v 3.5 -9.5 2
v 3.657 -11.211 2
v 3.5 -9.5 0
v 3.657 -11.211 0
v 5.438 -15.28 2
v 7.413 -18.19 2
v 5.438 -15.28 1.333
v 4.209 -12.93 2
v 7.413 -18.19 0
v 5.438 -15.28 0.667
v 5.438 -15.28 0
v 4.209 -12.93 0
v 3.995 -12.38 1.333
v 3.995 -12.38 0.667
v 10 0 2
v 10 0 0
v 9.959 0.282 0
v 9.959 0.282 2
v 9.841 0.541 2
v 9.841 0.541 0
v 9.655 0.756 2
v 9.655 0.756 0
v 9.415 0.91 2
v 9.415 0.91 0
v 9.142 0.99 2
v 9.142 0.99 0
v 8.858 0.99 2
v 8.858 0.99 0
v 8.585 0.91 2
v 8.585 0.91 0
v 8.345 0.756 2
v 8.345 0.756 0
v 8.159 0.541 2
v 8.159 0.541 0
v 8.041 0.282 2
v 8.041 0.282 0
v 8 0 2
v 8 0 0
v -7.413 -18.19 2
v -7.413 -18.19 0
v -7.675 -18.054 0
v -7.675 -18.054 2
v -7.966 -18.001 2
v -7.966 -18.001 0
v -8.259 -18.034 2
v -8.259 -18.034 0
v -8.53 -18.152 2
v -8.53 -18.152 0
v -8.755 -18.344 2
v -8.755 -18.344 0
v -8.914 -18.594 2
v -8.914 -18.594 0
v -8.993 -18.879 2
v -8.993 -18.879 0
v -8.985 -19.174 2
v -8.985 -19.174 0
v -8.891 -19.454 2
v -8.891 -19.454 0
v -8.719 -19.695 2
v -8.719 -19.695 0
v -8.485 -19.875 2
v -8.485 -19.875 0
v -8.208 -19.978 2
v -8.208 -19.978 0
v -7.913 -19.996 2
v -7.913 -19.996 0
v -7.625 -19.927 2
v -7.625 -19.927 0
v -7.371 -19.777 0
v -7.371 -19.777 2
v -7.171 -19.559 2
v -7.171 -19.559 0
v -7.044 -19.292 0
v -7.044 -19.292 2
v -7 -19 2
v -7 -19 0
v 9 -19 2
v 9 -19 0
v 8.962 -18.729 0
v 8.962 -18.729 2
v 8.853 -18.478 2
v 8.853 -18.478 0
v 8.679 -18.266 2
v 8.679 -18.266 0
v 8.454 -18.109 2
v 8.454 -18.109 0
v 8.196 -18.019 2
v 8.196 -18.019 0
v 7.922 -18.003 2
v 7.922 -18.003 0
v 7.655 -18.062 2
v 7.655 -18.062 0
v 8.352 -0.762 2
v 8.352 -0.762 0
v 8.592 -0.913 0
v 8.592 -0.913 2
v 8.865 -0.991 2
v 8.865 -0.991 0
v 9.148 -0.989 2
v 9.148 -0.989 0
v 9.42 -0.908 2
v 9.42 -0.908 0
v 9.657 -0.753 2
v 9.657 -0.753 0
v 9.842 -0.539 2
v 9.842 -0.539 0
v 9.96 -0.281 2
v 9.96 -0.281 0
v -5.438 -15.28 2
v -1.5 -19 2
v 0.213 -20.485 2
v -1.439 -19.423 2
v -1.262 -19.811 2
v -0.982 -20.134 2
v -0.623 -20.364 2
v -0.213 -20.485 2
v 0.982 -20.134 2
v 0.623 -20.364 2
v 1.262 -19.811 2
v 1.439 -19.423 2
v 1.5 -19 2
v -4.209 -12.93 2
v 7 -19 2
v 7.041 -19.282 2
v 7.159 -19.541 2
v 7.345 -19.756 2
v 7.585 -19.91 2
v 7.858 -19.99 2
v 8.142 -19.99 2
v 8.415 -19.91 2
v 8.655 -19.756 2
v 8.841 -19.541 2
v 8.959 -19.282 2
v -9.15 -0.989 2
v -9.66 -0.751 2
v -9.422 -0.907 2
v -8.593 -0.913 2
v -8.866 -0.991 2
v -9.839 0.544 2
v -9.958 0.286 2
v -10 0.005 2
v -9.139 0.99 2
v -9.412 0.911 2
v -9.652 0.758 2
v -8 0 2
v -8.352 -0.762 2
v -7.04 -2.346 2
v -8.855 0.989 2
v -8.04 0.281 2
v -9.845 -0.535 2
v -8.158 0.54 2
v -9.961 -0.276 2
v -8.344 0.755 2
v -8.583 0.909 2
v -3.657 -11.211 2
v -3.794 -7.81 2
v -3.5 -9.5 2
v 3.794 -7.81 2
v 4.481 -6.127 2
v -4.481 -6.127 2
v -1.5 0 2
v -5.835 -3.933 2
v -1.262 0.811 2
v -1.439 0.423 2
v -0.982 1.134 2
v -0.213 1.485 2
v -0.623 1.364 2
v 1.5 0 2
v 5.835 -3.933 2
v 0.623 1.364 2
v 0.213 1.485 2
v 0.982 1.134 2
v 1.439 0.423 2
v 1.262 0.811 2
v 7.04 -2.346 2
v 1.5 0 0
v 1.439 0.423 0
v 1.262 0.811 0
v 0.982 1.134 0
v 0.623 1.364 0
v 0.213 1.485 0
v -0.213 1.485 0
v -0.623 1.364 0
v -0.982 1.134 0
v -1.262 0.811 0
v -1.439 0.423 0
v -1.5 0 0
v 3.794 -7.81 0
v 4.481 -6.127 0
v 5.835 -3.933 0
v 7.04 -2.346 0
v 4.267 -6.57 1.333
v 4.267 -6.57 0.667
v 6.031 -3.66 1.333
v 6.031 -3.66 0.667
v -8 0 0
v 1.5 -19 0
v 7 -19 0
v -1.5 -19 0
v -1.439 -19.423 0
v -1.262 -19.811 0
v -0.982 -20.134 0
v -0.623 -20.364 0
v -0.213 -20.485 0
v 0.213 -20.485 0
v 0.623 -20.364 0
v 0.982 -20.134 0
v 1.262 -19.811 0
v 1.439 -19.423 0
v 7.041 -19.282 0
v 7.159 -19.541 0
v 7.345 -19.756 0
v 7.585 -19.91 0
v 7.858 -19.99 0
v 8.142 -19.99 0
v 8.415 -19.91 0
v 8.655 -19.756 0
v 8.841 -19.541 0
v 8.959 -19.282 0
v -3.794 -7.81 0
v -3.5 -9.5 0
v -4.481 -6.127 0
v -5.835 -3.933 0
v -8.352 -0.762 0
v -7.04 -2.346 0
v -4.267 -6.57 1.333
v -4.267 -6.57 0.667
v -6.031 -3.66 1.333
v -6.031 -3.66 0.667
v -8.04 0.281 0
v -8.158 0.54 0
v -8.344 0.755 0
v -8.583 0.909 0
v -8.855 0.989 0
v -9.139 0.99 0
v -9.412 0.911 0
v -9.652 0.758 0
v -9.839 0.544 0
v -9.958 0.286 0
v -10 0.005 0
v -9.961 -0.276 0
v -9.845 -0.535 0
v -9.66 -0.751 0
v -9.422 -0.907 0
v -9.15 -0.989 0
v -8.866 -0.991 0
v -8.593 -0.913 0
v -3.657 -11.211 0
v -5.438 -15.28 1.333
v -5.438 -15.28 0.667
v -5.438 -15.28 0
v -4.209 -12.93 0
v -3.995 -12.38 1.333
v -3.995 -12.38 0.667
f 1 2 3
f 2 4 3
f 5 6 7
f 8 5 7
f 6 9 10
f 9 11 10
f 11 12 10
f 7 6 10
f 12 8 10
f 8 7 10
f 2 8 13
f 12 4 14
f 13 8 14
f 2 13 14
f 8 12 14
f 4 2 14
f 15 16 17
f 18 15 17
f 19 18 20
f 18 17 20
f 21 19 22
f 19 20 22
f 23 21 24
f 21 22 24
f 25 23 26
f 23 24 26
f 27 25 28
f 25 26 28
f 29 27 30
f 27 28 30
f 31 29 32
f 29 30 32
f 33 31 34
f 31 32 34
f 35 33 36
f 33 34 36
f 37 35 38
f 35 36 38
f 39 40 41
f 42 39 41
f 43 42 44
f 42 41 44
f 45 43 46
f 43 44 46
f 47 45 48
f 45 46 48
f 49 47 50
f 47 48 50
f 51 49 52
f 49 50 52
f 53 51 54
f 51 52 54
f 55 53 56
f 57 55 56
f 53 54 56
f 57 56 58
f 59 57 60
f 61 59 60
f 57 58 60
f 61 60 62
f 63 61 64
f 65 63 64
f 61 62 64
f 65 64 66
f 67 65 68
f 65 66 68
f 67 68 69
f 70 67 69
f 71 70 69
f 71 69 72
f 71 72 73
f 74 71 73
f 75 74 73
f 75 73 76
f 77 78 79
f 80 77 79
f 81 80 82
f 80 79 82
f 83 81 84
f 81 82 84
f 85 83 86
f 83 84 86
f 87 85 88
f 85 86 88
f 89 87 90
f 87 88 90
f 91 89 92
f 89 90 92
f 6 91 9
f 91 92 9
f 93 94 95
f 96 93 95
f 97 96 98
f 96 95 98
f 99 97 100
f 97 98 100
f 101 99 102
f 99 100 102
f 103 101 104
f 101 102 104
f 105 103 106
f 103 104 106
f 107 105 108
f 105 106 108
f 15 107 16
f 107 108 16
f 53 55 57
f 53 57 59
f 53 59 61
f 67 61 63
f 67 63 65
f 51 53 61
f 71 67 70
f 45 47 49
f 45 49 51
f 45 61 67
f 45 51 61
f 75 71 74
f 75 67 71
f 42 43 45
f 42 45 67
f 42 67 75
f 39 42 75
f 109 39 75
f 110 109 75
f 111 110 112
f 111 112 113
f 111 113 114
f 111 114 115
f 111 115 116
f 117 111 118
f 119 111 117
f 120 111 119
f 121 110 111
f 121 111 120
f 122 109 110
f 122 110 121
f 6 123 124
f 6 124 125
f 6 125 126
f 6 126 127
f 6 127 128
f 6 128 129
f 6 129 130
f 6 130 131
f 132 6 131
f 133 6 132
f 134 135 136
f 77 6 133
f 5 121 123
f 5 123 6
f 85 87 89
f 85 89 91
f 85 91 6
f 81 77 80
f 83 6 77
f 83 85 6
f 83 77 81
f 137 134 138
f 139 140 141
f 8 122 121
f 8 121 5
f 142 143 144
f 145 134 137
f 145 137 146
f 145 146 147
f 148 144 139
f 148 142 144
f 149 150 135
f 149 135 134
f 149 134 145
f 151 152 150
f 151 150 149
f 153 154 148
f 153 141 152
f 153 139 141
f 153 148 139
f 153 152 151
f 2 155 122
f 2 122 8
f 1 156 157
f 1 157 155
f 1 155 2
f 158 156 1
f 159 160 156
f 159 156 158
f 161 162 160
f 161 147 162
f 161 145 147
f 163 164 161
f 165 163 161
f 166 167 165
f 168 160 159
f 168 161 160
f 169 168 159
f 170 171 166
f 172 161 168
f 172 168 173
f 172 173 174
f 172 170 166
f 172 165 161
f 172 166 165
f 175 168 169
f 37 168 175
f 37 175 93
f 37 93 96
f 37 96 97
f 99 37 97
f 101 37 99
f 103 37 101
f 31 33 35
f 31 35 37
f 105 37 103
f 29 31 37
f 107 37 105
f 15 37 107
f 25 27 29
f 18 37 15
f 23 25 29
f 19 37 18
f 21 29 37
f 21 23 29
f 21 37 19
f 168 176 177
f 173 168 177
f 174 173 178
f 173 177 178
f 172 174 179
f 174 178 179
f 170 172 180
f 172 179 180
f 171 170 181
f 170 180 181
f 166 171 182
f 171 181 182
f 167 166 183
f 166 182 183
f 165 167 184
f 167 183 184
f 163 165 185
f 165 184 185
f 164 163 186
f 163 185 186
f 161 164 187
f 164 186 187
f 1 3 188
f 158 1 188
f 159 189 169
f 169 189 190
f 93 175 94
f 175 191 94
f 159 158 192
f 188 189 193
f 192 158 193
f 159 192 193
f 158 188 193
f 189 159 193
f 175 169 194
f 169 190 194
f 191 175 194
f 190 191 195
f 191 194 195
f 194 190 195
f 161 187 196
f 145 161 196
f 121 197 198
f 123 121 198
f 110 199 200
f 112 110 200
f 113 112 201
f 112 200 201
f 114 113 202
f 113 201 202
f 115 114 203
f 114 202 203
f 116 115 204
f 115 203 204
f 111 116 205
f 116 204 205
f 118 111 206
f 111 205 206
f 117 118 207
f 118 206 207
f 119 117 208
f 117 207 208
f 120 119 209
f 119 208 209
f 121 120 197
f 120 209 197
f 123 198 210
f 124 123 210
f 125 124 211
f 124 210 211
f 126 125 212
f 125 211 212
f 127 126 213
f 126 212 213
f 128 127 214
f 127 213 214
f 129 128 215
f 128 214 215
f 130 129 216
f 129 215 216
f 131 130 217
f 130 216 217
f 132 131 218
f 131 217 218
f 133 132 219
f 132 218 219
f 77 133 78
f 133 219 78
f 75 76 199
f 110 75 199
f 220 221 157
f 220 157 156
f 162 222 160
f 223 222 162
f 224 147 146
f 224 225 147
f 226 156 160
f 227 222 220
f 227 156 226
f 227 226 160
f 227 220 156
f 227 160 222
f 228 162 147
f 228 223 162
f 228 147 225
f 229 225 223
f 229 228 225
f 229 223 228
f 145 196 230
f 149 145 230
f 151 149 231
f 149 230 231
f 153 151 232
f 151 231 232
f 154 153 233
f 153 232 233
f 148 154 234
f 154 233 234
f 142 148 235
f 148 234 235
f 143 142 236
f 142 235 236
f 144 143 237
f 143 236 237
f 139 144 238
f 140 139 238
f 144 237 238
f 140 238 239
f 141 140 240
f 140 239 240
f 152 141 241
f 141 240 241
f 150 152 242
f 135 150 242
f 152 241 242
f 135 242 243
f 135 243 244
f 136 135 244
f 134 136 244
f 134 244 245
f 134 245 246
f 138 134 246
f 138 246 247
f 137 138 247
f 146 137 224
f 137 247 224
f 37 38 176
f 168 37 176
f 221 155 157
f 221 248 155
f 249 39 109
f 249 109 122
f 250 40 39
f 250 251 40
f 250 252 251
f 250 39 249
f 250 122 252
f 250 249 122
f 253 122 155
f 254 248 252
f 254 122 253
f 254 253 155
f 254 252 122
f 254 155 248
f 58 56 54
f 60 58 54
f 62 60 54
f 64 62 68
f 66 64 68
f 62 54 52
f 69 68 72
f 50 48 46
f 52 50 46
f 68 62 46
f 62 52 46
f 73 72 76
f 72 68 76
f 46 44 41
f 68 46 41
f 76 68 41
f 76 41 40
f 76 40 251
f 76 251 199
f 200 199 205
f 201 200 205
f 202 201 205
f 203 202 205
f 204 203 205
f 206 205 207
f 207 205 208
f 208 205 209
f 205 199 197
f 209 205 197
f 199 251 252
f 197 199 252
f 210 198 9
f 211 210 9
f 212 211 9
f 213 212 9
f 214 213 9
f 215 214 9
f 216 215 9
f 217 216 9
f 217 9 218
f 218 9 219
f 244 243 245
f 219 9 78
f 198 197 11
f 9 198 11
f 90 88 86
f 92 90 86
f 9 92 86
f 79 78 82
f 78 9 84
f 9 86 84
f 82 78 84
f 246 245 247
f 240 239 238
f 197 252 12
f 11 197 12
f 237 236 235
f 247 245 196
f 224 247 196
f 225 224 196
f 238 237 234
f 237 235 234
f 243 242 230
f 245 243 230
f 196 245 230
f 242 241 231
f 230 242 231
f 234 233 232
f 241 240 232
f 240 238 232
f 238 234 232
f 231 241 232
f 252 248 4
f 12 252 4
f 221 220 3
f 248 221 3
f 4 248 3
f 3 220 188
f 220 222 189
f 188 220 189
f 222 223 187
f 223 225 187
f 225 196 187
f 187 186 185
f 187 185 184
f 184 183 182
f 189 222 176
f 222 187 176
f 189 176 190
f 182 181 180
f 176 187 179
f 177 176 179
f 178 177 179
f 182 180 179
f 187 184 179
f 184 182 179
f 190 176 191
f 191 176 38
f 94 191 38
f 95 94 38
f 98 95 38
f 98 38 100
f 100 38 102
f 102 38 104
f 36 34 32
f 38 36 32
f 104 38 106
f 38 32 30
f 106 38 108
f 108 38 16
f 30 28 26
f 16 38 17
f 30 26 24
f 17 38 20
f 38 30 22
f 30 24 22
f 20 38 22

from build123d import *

# Parameters (mm, degrees)
F1_DEPTH = 2


with BuildPart() as f1:
    # F0 (on Top) → F1 (new body)
    with BuildSketch(Plane.XY):
        with BuildLine():
            add(Edge.make_bspline(
                [(-8.3521283749, -0.7617495372), (-8.5671938563, -0.5078146578), (-8.7835969282, -0.2539073289), (-9, 0)],
                knots=[0.9592497634, 0.9592497634, 0.9592497634, 0.9592497634, 1, 1, 1, 1], degree=3))
            Line((-9, 0), (-8, 0))
            ThreePointArc((-8, 0), (-9.9077091013, 0.4196000327), (-8.3521283749, -0.7617495372))
        make_face()
        with BuildLine():
            Line((-8, 0), (-9, 0))
            add(Edge.make_bspline(
                [(-8.3521283749, -0.7617495372), (-8.5671938563, -0.5078146578), (-8.7835969282, -0.2539073289), (-9, 0)],
                knots=[0.9592497634, 0.9592497634, 0.9592497634, 0.9592497634, 1, 1, 1, 1], degree=3))
            ThreePointArc((-8.3521283749, -0.7617495372), (-8.0922908987, -0.4196000327), (-8, 0))
        make_face()
        with BuildLine():
            Line((-1.5, 0), (-8, 0))
            ThreePointArc((-8, 0), (-8.0922908987, -0.4196000327), (-8.3521283749, -0.7617495372))
            add(Edge.make_bspline(
                [(-3.5, -9.5), (-3.6213752497, -6.556436521), (-5.8997934607, -3.6573019366), (-8.3521283749, -0.7617495372)],
                knots=[0.4945855722, 0.4945855722, 0.4945855722, 0.4945855722, 0.9592497634, 0.9592497634, 0.9592497634, 0.9592497634], degree=3))
            Line((-3.5, -9.5), (0, -9.5))
            Line((0, -9.5), (0, -1.5))
            ThreePointArc((0, -1.5), (-1.0606601718, -1.0606601718), (-1.5, 0))
        make_face()
        with BuildLine():
            Line((0, 0), (-1.5, 0))
            ThreePointArc((-1.5, 0), (-1.0606601718, -1.0606601718), (0, -1.5))
            Line((0, -1.5), (0, 0))
        make_face()
        with BuildLine():
            ThreePointArc((1.5, 0), (0, 1.5), (-1.5, 0))
            Line((-1.5, 0), (0, 0))
            Line((0, 0), (1.5, 0))
        make_face()
        with BuildLine():
            Line((1.5, 0), (0, 0))
            Line((0, 0), (0, -1.5))
            ThreePointArc((0, -1.5), (1.0606601718, -1.0606601718), (1.5, 0))
        make_face()
        with BuildLine():
            Line((8, 0), (1.5, 0))
            ThreePointArc((1.5, 0), (1.0606601718, -1.0606601718), (0, -1.5))
            Line((0, -1.5), (0, -9.5))
            Line((0, -9.5), (3.5, -9.5))
            add(Edge.make_bspline(
                [(3.5, -9.5), (3.6213752497, -6.556436521), (5.8997934607, -3.6573019366), (8.3521283749, -0.7617495372)],
                knots=[0.4945855722, 0.4945855722, 0.4945855722, 0.4945855722, 0.9592497634, 0.9592497634, 0.9592497634, 0.9592497634], degree=3))
            ThreePointArc((8.3521283749, -0.7617495372), (8.0922908987, -0.4196000327), (8, 0))
        make_face()
        with BuildLine():
            Line((9, 0), (8, 0))
            ThreePointArc((8, 0), (8.0922908987, -0.4196000327), (8.3521283749, -0.7617495372))
            add(Edge.make_bspline(
                [(8.3521283749, -0.7617495372), (8.5671938563, -0.5078146578), (8.7835969282, -0.2539073289), (9, 0)],
                knots=[0.9592497634, 0.9592497634, 0.9592497634, 0.9592497634, 1, 1, 1, 1], degree=3))
        make_face()
        with BuildLine():
            ThreePointArc((10, 0), (9, 1), (8, 0))
            Line((8, 0), (9, 0))
            add(Edge.make_bspline(
                [(8.3521283749, -0.7617495372), (8.5671938563, -0.5078146578), (8.7835969282, -0.2539073289), (9, 0)],
                knots=[0.9592497634, 0.9592497634, 0.9592497634, 0.9592497634, 1, 1, 1, 1], degree=3))
            ThreePointArc((8.3521283749, -0.7617495372), (9.4196000327, -0.9077091013), (10, 0))
        make_face()
        with BuildLine():
            Line((0, -9.5), (-3.5, -9.5))
            add(Edge.make_bspline(
                [(-7.4128937144, -18.1904901425), (-5.3105671576, -15.277222995), (-3.3817599302, -12.3675298477), (-3.5, -9.5)],
                knots=[0.0419238759, 0.0419238759, 0.0419238759, 0.0419238759, 0.4945855722, 0.4945855722, 0.4945855722, 0.4945855722], degree=3))
            ThreePointArc((-7.4128937144, -18.1904901425), (-7.1091840017, -18.5456357659), (-7, -19))
            Line((-7, -19), (-1.5, -19))
            ThreePointArc((-1.5, -19), (-1.0606601718, -17.9393398282), (0, -17.5))
            Line((0, -17.5), (0, -9.5))
        make_face()
        with BuildLine():
            Line((3.5, -9.5), (0, -9.5))
            Line((0, -9.5), (0, -17.5))
            ThreePointArc((0, -17.5), (1.0606601718, -17.9393398282), (1.5, -19))
            Line((1.5, -19), (7, -19))
            ThreePointArc((7, -19), (7.1091840017, -18.5456357659), (7.4128937144, -18.1904901425))
            add(Edge.make_bspline(
                [(7.4128937144, -18.1904901425), (5.3105671576, -15.277222995), (3.3817599302, -12.3675298477), (3.5, -9.5)],
                knots=[0.0419238759, 0.0419238759, 0.0419238759, 0.0419238759, 0.4945855722, 0.4945855722, 0.4945855722, 0.4945855722], degree=3))
        make_face()
        with BuildLine():
            Line((0, -19), (0, -17.5))
            ThreePointArc((0, -17.5), (-1.0606601718, -17.9393398282), (-1.5, -19))
            Line((-1.5, -19), (0, -19))
        make_face()
        with BuildLine():
            ThreePointArc((1.5, -19), (1.0606601718, -17.9393398282), (0, -17.5))
            Line((0, -17.5), (0, -19))
            Line((0, -19), (1.5, -19))
        make_face()
        with BuildLine():
            Line((1.5, -19), (0, -19))
            Line((0, -19), (-1.5, -19))
            ThreePointArc((-1.5, -19), (0, -20.5), (1.5, -19))
        make_face()
        with BuildLine():
            add(Edge.make_bspline(
                [(-8, -19), (-7.8038017674, -18.7301531618), (-7.6076035348, -18.4603063237), (-7.4128937144, -18.1904901425)],
                knots=[0, 0, 0, 0, 0.0419238759, 0.0419238759, 0.0419238759, 0.0419238759], degree=3))
            ThreePointArc((-7.4128937144, -18.1904901425), (-8.8908159983, -19.4543642341), (-7, -19))
            Line((-7, -19), (-8, -19))
        make_face()
        with BuildLine():
            ThreePointArc((-7, -19), (-7.1091840017, -18.5456357659), (-7.4128937144, -18.1904901425))
            add(Edge.make_bspline(
                [(-8, -19), (-7.8038017674, -18.7301531618), (-7.6076035348, -18.4603063237), (-7.4128937144, -18.1904901425)],
                knots=[0, 0, 0, 0, 0.0419238759, 0.0419238759, 0.0419238759, 0.0419238759], degree=3))
            Line((-8, -19), (-7, -19))
        make_face()
        with BuildLine():
            add(Edge.make_bspline(
                [(8, -19), (7.8038017674, -18.7301531618), (7.6076035348, -18.4603063237), (7.4128937144, -18.1904901425)],
                knots=[0, 0, 0, 0, 0.0419238759, 0.0419238759, 0.0419238759, 0.0419238759], degree=3))
            ThreePointArc((7.4128937144, -18.1904901425), (7.1091840017, -18.5456357659), (7, -19))
            Line((7, -19), (8, -19))
        make_face()
        with BuildLine():
            ThreePointArc((9, -19), (8.4543642341, -18.1091840017), (7.4128937144, -18.1904901425))
            add(Edge.make_bspline(
                [(8, -19), (7.8038017674, -18.7301531618), (7.6076035348, -18.4603063237), (7.4128937144, -18.1904901425)],
                knots=[0, 0, 0, 0, 0.0419238759, 0.0419238759, 0.0419238759, 0.0419238759], degree=3))
            Line((8, -19), (7, -19))
            ThreePointArc((7, -19), (8, -20), (9, -19))
        make_face()
    extrude(amount=F1_DEPTH)


solid = f1.part
